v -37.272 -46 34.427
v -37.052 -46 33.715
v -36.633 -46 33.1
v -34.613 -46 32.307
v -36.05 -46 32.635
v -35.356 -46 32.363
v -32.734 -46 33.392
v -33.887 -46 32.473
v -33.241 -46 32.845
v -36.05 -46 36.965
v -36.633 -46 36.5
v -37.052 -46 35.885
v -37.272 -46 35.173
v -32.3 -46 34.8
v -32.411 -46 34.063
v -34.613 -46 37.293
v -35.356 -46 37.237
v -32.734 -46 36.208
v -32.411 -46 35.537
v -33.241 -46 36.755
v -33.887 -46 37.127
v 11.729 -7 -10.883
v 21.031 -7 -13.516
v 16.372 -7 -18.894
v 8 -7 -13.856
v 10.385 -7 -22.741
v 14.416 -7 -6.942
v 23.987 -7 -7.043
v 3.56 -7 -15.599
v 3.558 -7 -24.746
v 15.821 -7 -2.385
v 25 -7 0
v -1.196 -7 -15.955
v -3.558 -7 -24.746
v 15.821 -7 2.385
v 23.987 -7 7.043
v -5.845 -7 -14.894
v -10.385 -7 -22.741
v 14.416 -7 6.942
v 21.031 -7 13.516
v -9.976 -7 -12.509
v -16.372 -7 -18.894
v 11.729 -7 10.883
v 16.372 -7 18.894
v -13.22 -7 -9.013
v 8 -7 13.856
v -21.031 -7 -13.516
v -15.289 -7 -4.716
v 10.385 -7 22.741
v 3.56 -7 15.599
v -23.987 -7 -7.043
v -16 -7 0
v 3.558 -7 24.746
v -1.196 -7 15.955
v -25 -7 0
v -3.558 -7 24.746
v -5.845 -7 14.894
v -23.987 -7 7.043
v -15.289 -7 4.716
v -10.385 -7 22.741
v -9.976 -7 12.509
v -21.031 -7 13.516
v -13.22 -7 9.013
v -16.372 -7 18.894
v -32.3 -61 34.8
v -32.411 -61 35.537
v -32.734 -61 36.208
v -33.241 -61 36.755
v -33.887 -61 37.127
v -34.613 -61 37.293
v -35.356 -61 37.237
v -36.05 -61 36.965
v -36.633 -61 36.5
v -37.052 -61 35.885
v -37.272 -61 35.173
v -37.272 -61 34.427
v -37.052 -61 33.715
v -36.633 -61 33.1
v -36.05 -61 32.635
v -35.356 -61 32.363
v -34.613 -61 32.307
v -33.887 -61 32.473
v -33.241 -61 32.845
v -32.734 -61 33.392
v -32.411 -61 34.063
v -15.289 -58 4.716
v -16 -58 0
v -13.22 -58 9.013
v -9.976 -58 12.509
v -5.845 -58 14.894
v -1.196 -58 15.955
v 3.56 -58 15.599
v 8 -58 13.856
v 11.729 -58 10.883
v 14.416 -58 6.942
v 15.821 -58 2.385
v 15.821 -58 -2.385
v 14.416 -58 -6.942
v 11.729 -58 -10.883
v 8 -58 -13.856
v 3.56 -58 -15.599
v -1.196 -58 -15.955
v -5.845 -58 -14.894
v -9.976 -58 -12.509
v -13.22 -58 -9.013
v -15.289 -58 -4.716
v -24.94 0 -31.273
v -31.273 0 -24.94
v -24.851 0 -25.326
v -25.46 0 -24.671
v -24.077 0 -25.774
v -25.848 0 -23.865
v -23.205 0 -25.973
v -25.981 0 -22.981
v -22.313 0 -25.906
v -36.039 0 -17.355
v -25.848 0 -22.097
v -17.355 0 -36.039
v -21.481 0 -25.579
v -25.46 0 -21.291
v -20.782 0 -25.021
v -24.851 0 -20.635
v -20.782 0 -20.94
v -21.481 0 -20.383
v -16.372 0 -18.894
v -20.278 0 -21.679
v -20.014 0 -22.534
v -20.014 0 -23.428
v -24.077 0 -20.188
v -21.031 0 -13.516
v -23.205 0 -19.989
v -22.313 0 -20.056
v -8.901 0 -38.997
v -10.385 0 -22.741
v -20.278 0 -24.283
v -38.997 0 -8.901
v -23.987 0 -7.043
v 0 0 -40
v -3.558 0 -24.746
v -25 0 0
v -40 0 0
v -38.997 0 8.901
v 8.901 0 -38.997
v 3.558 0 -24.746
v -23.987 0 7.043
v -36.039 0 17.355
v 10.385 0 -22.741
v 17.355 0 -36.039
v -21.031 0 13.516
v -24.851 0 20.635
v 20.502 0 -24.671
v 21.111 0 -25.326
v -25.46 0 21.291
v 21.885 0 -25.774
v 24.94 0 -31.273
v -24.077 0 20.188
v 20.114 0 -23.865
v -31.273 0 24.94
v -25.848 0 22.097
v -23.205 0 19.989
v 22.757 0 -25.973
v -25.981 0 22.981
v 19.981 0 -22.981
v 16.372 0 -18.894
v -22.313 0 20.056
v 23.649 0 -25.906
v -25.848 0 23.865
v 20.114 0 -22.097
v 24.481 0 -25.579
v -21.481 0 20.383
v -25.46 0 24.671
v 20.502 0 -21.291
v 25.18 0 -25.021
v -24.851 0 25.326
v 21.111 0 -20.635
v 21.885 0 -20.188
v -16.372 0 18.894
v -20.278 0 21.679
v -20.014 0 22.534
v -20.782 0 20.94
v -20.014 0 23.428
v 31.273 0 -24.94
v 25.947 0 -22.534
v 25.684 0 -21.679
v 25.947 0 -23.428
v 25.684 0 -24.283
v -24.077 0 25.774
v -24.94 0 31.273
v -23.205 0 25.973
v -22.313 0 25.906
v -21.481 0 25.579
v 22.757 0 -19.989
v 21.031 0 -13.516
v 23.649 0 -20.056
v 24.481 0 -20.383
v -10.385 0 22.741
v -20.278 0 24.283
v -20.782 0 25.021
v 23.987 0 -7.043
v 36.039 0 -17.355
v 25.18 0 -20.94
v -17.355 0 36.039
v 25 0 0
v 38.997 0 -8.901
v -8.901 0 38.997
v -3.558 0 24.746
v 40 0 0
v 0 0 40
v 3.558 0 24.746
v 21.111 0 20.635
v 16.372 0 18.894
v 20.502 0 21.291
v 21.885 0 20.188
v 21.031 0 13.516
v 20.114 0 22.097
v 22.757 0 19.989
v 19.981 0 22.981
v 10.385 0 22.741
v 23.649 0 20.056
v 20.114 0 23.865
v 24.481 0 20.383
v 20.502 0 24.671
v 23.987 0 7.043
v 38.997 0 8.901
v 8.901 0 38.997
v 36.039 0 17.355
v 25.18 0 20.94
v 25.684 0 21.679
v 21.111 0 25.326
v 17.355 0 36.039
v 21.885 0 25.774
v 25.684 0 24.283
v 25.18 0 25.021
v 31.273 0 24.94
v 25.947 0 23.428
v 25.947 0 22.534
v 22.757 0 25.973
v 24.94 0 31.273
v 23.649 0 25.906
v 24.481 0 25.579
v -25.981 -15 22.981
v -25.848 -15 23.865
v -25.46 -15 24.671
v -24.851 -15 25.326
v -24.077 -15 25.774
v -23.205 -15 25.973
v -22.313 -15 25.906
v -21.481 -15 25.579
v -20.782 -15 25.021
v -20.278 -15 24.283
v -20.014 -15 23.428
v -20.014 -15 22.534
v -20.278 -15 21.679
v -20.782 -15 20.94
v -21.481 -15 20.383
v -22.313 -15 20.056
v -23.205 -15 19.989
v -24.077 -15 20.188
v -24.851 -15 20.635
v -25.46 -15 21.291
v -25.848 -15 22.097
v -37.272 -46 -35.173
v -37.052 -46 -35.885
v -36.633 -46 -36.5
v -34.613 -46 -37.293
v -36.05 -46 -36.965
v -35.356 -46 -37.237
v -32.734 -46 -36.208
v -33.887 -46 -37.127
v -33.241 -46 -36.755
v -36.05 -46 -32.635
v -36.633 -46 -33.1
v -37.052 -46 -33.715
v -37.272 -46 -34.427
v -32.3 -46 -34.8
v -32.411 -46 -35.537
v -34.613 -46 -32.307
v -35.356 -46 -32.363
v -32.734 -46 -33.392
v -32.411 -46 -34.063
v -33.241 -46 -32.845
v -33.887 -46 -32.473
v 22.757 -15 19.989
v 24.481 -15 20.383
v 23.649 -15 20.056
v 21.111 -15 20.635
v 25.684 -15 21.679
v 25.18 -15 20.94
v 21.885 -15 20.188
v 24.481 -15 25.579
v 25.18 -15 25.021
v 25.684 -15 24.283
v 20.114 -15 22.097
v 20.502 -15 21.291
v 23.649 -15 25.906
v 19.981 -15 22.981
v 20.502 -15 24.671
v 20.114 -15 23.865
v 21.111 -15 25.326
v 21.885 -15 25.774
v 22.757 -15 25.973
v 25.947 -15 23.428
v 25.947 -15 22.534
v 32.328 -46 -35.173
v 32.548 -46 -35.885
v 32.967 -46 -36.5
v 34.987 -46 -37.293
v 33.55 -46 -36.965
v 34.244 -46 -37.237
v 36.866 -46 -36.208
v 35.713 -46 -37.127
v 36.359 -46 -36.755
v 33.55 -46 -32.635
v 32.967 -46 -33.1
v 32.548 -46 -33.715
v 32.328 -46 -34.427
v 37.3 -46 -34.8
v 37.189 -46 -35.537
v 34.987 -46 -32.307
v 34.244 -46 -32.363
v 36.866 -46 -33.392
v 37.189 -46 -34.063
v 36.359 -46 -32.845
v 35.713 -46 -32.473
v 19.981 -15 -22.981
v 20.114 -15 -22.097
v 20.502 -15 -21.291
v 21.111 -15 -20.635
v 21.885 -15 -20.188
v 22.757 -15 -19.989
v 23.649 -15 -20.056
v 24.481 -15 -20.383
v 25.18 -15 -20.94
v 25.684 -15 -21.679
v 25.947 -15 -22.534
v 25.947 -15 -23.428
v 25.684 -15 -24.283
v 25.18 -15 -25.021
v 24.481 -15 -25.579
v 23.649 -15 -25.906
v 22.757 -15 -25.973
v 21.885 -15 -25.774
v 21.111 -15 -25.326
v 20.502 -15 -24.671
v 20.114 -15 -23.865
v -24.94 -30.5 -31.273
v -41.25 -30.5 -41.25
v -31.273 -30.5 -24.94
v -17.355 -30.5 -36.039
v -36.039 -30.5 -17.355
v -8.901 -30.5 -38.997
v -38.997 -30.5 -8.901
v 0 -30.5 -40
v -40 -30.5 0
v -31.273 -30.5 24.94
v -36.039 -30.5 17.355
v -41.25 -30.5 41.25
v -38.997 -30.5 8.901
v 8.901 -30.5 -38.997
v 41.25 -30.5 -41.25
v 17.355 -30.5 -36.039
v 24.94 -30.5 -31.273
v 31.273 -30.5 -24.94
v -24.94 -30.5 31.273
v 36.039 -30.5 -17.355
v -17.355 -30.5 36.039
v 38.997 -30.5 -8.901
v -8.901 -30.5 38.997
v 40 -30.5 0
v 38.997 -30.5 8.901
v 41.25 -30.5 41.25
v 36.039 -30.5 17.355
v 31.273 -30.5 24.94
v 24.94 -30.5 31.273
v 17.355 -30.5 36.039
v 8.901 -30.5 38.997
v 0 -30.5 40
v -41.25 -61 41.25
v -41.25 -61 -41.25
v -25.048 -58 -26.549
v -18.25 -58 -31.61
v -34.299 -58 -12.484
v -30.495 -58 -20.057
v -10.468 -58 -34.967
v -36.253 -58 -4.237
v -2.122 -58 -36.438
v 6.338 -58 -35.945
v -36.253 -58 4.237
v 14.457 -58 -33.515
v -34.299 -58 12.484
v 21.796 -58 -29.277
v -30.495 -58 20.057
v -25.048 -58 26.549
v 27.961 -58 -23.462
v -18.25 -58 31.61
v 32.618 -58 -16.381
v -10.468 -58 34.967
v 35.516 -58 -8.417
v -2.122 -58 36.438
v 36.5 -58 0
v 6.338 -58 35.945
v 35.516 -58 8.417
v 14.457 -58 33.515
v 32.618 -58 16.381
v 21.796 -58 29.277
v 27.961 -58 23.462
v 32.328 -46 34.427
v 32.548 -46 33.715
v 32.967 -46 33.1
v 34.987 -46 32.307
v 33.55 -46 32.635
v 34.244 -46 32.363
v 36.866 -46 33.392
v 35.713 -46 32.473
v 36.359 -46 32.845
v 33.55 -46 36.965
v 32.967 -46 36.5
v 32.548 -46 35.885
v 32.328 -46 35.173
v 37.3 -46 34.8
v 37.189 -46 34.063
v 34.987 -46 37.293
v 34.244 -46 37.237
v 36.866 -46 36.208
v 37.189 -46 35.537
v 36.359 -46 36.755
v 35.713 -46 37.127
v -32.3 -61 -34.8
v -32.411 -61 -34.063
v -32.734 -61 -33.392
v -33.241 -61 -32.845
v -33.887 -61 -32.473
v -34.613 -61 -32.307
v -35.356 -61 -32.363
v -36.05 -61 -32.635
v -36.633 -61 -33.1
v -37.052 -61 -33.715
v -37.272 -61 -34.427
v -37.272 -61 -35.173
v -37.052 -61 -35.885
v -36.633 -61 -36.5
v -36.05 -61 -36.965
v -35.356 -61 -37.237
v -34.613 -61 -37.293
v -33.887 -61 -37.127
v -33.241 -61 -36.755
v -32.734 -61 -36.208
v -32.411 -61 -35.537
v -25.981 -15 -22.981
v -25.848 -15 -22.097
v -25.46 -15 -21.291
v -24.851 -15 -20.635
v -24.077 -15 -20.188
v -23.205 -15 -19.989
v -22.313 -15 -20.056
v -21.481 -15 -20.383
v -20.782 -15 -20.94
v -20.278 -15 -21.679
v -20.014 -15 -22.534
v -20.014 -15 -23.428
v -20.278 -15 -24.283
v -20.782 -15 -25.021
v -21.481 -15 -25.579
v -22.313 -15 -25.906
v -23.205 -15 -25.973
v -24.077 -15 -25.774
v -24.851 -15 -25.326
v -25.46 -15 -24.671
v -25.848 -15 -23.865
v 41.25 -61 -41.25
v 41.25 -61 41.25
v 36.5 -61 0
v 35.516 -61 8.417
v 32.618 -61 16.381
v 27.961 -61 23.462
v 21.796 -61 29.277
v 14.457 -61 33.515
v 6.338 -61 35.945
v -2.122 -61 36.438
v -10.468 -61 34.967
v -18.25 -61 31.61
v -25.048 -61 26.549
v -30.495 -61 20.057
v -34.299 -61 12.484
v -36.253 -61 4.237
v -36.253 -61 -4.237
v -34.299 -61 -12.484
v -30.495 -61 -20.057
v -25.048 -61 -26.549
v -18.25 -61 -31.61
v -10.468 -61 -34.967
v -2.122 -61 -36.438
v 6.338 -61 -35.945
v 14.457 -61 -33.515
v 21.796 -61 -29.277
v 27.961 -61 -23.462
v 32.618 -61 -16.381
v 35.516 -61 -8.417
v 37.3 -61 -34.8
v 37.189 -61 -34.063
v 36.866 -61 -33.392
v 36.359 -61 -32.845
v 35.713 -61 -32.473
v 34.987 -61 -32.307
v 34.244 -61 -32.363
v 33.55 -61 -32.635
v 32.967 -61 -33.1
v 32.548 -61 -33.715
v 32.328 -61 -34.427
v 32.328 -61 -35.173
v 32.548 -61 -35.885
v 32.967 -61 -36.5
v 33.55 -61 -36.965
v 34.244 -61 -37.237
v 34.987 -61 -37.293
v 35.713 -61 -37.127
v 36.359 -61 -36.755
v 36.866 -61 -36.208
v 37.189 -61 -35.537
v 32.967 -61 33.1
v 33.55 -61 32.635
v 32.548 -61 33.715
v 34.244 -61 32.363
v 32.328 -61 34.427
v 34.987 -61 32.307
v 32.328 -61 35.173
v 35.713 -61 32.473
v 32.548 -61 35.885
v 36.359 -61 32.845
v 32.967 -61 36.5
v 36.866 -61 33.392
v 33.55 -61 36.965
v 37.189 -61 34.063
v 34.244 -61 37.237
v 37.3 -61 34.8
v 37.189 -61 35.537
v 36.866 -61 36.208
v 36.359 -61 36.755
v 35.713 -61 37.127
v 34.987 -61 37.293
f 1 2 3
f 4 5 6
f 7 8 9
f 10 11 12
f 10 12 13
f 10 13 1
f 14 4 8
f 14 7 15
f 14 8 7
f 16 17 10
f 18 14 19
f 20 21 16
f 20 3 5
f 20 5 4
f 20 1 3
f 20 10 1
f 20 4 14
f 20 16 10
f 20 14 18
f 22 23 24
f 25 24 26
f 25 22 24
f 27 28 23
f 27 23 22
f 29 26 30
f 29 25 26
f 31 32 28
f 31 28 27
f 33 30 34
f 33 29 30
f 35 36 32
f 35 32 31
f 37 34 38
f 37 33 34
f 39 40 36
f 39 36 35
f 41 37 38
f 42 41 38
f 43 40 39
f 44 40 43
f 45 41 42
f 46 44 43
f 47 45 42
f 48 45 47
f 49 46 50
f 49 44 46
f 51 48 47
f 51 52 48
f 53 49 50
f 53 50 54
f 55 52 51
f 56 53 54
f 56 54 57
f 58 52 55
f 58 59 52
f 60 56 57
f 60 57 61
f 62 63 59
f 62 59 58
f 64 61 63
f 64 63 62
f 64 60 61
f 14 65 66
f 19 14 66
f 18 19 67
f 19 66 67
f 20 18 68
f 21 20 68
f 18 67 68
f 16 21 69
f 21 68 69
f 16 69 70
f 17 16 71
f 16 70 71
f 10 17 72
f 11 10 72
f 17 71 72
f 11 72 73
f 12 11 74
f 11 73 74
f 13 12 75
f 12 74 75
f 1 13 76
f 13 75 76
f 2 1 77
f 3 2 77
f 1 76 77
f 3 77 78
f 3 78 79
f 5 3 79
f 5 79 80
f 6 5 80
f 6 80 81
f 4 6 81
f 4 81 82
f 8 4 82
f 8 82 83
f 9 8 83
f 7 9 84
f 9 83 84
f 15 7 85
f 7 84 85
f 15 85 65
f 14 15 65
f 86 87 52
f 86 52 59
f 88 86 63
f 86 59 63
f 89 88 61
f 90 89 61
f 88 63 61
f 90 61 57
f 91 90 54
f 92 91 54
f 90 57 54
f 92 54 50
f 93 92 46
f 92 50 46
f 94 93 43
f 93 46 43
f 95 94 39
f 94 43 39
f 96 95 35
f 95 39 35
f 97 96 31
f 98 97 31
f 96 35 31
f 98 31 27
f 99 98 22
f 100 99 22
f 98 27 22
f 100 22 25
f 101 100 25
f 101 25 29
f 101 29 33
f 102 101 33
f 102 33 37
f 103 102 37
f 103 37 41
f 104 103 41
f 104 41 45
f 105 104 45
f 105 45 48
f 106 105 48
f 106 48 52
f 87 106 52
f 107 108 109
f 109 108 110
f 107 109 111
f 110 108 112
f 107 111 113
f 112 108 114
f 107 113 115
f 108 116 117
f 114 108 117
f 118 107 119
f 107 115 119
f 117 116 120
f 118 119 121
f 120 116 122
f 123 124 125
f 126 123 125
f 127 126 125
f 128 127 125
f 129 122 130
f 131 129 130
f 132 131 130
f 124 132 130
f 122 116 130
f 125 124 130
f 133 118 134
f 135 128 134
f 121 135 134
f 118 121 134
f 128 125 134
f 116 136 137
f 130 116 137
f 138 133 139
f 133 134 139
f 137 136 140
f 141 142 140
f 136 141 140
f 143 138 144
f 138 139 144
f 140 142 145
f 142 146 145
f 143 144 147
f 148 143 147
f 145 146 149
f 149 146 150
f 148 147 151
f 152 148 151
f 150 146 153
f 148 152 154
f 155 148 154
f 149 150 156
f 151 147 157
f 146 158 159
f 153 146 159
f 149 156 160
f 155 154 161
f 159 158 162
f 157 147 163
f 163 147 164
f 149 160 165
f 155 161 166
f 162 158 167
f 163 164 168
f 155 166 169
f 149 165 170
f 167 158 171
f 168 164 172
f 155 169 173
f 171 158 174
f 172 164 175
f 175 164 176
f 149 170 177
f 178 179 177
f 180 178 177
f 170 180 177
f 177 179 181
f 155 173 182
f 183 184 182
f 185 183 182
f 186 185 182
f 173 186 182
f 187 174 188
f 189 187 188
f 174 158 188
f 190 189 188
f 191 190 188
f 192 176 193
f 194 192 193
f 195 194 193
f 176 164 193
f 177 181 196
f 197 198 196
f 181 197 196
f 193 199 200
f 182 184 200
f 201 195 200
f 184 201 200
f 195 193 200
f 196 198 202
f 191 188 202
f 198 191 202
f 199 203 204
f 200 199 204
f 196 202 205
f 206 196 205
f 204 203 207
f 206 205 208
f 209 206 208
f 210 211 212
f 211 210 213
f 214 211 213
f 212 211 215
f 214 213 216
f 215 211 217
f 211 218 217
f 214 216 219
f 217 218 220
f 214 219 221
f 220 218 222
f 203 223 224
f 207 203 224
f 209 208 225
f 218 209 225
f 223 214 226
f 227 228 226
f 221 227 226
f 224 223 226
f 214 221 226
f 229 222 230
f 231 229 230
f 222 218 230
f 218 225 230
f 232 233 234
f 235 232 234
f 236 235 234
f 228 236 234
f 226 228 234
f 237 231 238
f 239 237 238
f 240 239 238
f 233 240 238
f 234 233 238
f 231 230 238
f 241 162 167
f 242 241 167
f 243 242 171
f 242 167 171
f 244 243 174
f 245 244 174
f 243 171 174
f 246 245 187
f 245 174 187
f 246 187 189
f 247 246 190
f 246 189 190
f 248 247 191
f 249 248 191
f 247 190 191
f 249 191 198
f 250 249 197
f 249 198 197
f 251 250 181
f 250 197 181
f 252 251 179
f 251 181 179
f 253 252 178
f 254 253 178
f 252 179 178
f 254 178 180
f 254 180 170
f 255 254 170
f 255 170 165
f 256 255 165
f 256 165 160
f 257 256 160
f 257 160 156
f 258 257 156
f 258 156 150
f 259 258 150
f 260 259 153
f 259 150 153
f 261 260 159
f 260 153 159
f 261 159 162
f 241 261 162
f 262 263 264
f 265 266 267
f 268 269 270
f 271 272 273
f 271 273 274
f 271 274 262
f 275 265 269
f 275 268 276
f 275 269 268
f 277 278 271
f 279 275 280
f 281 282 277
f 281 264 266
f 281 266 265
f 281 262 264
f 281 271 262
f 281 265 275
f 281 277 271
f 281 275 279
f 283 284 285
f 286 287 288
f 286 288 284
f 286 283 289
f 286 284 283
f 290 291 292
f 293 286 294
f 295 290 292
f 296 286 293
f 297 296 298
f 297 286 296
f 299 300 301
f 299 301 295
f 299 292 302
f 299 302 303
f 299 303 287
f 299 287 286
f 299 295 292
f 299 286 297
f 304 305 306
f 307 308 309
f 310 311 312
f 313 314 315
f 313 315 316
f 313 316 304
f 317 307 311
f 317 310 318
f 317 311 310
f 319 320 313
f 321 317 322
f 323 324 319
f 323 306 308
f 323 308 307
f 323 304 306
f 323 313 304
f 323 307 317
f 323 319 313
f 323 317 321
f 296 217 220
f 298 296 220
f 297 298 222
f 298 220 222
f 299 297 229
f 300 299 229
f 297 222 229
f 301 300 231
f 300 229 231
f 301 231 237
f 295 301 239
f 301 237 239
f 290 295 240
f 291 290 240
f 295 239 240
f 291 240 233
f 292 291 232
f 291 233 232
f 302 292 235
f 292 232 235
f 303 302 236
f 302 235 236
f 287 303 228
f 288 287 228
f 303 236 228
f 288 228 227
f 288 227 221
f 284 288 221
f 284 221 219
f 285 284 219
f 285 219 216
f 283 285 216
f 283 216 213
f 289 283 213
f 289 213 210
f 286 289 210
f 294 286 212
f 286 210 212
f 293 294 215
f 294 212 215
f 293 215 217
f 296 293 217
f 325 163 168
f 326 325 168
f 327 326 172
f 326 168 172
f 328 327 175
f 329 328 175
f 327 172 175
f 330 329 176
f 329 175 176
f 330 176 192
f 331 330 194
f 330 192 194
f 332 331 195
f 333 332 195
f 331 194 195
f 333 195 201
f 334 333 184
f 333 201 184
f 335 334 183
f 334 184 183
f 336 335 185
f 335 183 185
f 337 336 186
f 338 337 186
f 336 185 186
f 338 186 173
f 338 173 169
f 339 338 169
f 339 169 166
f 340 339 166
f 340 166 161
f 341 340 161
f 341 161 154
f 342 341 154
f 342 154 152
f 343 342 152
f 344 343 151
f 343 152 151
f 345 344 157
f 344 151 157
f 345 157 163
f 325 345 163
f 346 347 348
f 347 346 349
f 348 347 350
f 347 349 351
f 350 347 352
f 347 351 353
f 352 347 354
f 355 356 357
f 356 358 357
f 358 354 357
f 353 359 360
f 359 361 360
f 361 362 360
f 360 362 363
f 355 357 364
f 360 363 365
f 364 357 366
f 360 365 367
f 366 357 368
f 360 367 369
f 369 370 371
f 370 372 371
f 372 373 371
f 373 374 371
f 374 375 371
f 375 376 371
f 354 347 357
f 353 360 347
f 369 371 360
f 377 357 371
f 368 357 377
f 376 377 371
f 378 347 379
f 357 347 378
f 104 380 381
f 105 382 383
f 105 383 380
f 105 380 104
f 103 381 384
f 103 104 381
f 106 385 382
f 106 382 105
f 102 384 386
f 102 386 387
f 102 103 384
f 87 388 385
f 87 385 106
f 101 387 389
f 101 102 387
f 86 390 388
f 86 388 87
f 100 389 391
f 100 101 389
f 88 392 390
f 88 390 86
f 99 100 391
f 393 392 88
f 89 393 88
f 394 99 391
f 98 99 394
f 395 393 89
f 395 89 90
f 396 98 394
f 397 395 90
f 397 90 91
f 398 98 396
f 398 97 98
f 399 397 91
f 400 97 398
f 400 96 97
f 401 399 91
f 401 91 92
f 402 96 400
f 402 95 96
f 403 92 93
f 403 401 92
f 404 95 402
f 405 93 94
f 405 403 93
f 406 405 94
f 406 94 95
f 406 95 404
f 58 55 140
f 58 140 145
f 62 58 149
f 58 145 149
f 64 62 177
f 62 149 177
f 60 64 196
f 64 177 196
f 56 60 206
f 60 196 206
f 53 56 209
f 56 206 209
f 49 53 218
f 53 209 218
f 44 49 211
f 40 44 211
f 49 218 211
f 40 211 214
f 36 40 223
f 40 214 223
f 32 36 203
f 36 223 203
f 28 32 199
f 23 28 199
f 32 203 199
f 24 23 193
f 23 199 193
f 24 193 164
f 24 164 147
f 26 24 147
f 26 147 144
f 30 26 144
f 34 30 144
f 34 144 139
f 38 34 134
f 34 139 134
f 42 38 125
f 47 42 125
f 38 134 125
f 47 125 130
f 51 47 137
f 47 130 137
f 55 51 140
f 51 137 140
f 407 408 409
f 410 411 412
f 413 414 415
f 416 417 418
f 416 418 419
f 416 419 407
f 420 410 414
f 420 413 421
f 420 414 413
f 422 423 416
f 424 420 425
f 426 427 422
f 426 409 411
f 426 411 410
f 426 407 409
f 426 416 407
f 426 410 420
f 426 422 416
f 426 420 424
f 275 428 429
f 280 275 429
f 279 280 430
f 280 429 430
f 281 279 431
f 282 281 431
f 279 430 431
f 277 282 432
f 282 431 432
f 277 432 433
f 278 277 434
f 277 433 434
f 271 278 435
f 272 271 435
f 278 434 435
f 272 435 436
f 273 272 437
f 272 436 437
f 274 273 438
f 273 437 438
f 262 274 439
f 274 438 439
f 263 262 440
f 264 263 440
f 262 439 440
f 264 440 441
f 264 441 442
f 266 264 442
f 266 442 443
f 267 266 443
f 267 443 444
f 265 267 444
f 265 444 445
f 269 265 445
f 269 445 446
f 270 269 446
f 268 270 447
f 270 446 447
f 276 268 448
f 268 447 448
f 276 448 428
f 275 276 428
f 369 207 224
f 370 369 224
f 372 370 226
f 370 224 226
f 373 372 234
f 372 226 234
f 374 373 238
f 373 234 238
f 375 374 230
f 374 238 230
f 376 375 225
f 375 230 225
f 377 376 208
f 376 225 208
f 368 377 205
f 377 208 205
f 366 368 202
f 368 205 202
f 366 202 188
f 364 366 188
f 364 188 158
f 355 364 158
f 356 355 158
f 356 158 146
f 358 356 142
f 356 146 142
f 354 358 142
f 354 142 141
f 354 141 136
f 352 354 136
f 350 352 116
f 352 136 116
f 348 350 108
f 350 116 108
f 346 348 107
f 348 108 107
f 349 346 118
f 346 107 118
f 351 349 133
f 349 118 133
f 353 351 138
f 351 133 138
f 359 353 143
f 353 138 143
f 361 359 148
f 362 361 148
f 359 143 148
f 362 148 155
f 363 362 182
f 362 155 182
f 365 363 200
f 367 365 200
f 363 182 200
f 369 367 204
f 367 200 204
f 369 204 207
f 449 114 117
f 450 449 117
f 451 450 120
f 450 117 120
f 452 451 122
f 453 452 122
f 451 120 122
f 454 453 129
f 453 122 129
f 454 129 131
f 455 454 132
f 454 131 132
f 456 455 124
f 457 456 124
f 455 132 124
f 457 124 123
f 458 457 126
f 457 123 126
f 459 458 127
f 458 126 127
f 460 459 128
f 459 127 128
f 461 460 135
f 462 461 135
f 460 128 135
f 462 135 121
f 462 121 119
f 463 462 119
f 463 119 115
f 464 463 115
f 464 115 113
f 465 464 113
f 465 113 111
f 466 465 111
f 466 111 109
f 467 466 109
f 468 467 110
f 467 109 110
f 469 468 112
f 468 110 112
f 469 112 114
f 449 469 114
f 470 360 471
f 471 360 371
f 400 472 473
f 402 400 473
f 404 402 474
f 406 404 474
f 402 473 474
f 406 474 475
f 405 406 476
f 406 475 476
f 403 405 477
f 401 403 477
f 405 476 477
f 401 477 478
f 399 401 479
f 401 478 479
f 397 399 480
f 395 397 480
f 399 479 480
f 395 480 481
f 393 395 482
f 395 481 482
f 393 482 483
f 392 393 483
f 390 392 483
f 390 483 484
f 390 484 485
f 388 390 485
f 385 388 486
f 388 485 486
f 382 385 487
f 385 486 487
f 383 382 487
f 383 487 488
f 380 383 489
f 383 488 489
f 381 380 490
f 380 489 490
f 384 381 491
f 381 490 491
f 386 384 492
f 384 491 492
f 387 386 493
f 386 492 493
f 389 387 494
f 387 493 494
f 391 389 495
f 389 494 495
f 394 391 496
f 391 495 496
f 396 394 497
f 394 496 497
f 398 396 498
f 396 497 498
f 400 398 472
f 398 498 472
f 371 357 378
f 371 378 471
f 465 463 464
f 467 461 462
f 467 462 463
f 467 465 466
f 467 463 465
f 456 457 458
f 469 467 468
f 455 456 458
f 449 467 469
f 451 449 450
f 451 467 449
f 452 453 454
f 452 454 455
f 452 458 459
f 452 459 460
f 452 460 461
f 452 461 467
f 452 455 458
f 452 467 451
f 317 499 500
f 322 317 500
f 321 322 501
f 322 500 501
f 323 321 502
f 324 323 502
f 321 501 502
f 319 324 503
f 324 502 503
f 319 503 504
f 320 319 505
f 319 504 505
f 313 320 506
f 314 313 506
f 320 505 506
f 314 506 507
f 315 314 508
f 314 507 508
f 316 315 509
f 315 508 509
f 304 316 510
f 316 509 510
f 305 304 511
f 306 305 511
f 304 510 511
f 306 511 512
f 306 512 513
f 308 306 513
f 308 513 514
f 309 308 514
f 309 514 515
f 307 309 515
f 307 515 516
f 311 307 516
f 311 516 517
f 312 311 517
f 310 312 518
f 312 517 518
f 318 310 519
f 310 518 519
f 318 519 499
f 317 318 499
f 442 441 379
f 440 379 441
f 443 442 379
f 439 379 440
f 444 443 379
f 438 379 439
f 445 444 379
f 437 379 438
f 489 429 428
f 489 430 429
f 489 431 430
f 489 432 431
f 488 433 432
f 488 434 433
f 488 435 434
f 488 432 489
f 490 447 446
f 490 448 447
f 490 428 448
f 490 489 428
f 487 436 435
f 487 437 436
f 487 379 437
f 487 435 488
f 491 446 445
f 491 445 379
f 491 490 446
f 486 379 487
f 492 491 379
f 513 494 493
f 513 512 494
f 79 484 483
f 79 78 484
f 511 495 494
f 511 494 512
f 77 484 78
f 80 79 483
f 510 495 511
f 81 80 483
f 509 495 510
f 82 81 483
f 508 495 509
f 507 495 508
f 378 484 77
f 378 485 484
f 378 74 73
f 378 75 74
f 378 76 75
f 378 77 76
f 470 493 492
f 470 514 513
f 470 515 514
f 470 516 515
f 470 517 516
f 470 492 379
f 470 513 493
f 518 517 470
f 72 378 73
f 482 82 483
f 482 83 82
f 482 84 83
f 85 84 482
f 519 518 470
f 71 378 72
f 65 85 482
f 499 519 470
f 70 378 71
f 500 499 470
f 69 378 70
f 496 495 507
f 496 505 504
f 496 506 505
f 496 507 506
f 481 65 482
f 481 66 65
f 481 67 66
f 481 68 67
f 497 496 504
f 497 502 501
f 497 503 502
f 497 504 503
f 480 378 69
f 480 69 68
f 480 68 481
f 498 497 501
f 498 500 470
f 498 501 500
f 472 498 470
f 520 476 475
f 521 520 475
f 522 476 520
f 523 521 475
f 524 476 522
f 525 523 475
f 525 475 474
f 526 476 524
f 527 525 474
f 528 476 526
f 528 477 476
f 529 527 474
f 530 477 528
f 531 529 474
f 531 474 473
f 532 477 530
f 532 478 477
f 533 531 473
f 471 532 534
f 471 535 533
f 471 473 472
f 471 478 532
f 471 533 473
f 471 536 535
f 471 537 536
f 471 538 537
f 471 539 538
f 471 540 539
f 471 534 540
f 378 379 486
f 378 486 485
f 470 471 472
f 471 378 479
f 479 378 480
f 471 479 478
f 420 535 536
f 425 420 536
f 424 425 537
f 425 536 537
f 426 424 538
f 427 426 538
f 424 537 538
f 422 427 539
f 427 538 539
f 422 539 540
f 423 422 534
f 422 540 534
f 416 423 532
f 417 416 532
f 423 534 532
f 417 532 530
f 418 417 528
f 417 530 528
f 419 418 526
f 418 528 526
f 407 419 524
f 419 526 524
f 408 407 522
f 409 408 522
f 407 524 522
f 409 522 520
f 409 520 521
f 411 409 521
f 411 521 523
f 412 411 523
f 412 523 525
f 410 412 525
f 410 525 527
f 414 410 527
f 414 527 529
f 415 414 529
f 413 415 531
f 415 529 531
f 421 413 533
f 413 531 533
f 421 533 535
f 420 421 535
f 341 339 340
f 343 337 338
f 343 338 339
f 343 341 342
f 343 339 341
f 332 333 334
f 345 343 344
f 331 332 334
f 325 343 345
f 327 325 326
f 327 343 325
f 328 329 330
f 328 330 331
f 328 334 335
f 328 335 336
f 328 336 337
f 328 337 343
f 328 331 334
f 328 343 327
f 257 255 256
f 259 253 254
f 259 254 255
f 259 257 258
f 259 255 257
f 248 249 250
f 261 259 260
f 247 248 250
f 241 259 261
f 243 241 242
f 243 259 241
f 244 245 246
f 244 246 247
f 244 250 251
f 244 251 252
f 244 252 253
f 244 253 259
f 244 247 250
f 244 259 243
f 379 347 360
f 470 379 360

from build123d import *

# Parameters (mm, degrees)
F0_R      = 40
F1_DEPTH  = 30.5
F2_W      = 82.500003
F2_H      = 82.5
F3_DEPTH  = 30.5
F4_R      = 16
F5_DEPTH  = 61.001
F6_R      = 36.5
F7_DEPTH  = 3
F8_R      = 25
F9_DEPTH  = 7
F10_R     = 2.5
F11_DEPTH = 15
F12_R     = 3
F13_DEPTH = 15


with BuildPart() as f1:
    # F0 (on Front) → F1 (new body)
    with BuildSketch(Plane.XZ):
        Circle(F0_R)
    extrude(amount=F1_DEPTH)

    # F2 (on face) → F3 (join)
    with BuildSketch(Plane.XZ.offset(30.5)):
        with Locations((-1e-06, 0)):
            Rectangle(F2_W, F2_H)
    extrude(amount=F3_DEPTH)

    # F4 (on face) → F5 (cut, through all)
    with BuildSketch(Plane(origin=(0, 0, 0), x_dir=(-1, 0, 0), z_dir=(0, 1, 0))):
        Circle(F4_R)
    extrude(amount=-F5_DEPTH, mode=Mode.SUBTRACT)

    # F6 (on face) → F7 (cut)
    with BuildSketch(Plane.XZ.offset(61)):
        Circle(F6_R)
    extrude(amount=-F7_DEPTH, mode=Mode.SUBTRACT)

    # F8 (on face) → F9 (cut)
    with BuildSketch(Plane(origin=(0, 0, 0), x_dir=(-1, 0, 0), z_dir=(0, 1, 0))):
        Circle(F8_R)
    extrude(amount=-F9_DEPTH, mode=Mode.SUBTRACT)

    # F10 (on face) → F11 (cut)
    with BuildSketch(Plane.XZ.offset(61)):
        with Locations((-34.8, 34.8)):
            Circle(F10_R)
        with Locations((34.8, 34.8)):
            Circle(F10_R)
        with Locations((34.8, -34.8)):
            Circle(F10_R)
        with Locations((-34.8, -34.8)):
            Circle(F10_R)
    extrude(amount=-F11_DEPTH, mode=Mode.SUBTRACT)

    # F12 (on face) → F13 (cut)
    with BuildSketch(Plane(origin=(0, 0, 0), x_dir=(-1, 0, 0), z_dir=(0, 1, 0))):
        with Locations((-22.98097, 22.98097)):
            Circle(F12_R)
        with Locations((-22.98097, -22.98097)):
            Circle(F12_R)
        with Locations((22.98097, -22.98097)):
            Circle(F12_R)
        with Locations((22.98097, 22.98097)):
            Circle(F12_R)
    extrude(amount=-F13_DEPTH, mode=Mode.SUBTRACT)


solid = f1.part
